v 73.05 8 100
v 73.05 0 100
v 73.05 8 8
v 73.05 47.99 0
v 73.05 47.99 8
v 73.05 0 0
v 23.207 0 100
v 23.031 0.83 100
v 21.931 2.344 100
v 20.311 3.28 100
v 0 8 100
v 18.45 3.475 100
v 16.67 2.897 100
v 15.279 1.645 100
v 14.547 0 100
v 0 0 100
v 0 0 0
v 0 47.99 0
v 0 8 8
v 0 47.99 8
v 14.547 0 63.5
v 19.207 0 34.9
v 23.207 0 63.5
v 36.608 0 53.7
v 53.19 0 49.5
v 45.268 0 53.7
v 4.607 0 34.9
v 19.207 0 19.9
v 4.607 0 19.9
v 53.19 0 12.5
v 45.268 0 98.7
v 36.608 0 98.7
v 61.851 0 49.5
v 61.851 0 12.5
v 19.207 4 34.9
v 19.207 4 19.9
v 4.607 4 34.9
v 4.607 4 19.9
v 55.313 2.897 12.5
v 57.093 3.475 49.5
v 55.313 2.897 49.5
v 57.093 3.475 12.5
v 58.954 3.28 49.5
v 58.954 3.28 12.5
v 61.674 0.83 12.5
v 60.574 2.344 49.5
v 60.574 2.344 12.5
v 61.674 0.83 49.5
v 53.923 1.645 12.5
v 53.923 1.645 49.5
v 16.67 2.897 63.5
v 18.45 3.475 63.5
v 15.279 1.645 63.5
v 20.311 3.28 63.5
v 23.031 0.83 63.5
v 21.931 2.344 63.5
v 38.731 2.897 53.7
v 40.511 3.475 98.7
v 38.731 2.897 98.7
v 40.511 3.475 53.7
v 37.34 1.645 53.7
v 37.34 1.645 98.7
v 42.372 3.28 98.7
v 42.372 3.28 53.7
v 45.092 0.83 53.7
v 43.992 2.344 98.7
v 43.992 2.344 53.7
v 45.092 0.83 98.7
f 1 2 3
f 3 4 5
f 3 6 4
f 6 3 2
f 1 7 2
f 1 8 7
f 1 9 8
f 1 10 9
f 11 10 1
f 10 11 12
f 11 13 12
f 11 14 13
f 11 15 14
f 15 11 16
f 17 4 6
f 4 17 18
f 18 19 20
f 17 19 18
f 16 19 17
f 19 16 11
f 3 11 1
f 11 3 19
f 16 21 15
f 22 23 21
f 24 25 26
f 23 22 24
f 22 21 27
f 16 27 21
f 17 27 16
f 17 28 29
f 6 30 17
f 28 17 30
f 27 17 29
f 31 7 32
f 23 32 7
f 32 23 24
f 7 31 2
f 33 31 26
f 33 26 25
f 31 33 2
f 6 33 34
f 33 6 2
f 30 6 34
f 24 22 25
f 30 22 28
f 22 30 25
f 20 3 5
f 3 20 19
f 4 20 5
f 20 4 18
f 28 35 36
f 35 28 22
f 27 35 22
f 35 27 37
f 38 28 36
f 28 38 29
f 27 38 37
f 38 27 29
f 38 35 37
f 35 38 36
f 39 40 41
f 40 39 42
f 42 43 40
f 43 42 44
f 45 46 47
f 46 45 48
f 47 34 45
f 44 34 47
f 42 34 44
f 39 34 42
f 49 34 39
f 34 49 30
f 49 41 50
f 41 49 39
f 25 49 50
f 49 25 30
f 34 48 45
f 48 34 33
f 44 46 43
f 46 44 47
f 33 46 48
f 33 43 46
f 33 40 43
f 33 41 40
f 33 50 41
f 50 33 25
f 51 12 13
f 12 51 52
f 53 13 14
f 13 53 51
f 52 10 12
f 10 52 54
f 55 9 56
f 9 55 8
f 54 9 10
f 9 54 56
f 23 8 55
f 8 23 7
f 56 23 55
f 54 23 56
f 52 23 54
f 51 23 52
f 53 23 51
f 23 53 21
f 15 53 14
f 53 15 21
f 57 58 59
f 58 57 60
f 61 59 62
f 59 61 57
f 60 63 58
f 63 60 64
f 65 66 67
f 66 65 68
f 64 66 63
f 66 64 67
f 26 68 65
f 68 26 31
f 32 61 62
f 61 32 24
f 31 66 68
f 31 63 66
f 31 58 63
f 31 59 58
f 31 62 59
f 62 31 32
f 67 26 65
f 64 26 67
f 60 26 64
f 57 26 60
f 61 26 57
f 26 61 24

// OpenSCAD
/* doodle-meta {"version":1,"parameters":{"width":{"label":"Overall width","description":"Changes the body width","unit":"mm","feature":"body_width"},"depth":{"label":"Overall depth","description":"Changes the body depth","unit":"mm","feature":"body_depth"},"height":{"label":"Overall height","description":"Changes the body height","unit":"mm","feature":"body_height"},"backplate_thickness":{"label":"Backplate thickness","description":"Thickness of the vertical backplate","unit":"mm","feature":"backplate"},"base_thickness":{"label":"Base thickness","description":"Thickness of the horizontal base flange","unit":"mm","feature":"base"},"cutout_rect_w":{"label":"Rect cutout width","description":"Width of the top-left rectangular cutout","unit":"mm","feature":"cutout_rect"},"cutout_rect_h":{"label":"Rect cutout height","description":"Height of the top-left rectangular cutout","unit":"mm","feature":"cutout_rect"},"cutout_slot_w":{"label":"Slot width","description":"Width of the vertical slot cutouts","unit":"mm","feature":"cutout_slot"},"cutout_slot_h_top":{"label":"Top slot height","description":"Height of the top-middle slot cutout","unit":"mm","feature":"cutout_slot"},"cutout_slot_h_bot":{"label":"Bottom slot height","description":"Height of the bottom slot cutouts","unit":"mm","feature":"cutout_slot"}},"features":{"body_width":{"kind":"dimension","axis":"x","label":"Overall width"},"body_depth":{"kind":"dimension","axis":"y","label":"Overall depth"},"body_height":{"kind":"dimension","axis":"z","label":"Overall height"},"backplate":{"kind":"region","label":"Vertical backplate","min":[0,0,0],"max":[{"parameter":"width"},{"parameter":"backplate_thickness"},{"parameter":"height"}]},"base":{"kind":"region","label":"Horizontal base","min":[0,0,0],"max":[{"parameter":"width"},{"parameter":"depth"},{"parameter":"base_thickness"}]},"cutout_rect":{"kind":"region","label":"Top-left rectangle cutout","min":[{"parameter":"width","scale":0.063,"offset":0},{"parameter":"backplate_thickness","offset":-1},{"parameter":"height","scale":0.214,"offset":0}],"max":[{"parameter":"width","scale":0.263,"offset":0},{"parameter":"backplate_thickness","offset":1},{"parameter":"height","scale":0.364,"offset":0}]},"cutout_slot":{"kind":"region","label":"Slot cutouts","min":[{"parameter":"width","scale":0.113,"offset":0},{"parameter":"backplate_thickness","offset":-1},{"parameter":"height","scale":0.088,"offset":0}],"max":[{"parameter":"width","scale":0.838,"offset":0},{"parameter":"backplate_thickness","offset":1},{"parameter":"height","scale":0.866,"offset":0}]}}} */

// --- Parameters ---
width = 73.05;
depth = 47.99;
height = 100.0;
backplate_thickness = 8.0;
base_thickness = 8.0;

// Cutout dimensions (derived from normalized view measurements)
cutout_rect_w = 14.6;
cutout_rect_h = 15.0;
cutout_slot_w = 9.0;
cutout_slot_h_top = 36.0;
cutout_slot_h_bot = 44.0;

// Cutout centers (derived from evaluation missing centroids)
// Front view mapping: X = u * width, Z = (1 - v) * height
rect_cx = 0.163 * width;
rect_cz = (1.0 - 0.726) * height;

slot_top_cx = 0.788 * width;
slot_top_cz = (1.0 - 0.69) * height;

slot_bl_cx = 0.259 * width;
slot_bl_cz = (1.0 - 0.14) * height;

slot_br_cx = 0.561 * width;
slot_br_cz = (1.0 - 0.238) * height;

// --- Modules ---
// Vertical slot (stadium) centered at (cx, cz) in XZ plane, cutting through Y (the backplate).
module slot_cutter(w, h, cx, cz) {
    r = w / 2;
    straight = h - w;
    translate([cx, -1, cz])
        hull() {
            translate([0, 0,  straight/2]) cylinder(r=r, h=backplate_thickness+2, center=true);
            translate([0, 0, -straight/2]) cylinder(r=r, h=backplate_thickness+2, center=true);
        }
}

// Rectangle centered at (cx, cz) in XZ plane, cutting through Y (the backplate).
module rect_cutter(w, h, cx, cz) {
    translate([cx, -1, cz])
        cube([w, backplate_thickness + 2, h], center=true);
}

// --- Main Design ---
difference() {
    // 1. Positive Body: L-Shape
    union() {
        // Vertical Backplate (Back side, full height)
        cube([width, backplate_thickness, height]);
        // Horizontal Base (Bottom, extending forward)
        cube([width, depth, base_thickness]);
    }

    // 2. Subtractive Cutouts (Through the backplate, along Y)
    rect_cutter(cutout_rect_w, cutout_rect_h, rect_cx, rect_cz);
    slot_cutter(cutout_slot_w, cutout_slot_h_top, slot_top_cx, slot_top_cz);
    slot_cutter(cutout_slot_w, cutout_slot_h_bot, slot_bl_cx, slot_bl_cz);
    slot_cutter(cutout_slot_w, cutout_slot_h_bot, slot_br_cx, slot_br_cz);
}
